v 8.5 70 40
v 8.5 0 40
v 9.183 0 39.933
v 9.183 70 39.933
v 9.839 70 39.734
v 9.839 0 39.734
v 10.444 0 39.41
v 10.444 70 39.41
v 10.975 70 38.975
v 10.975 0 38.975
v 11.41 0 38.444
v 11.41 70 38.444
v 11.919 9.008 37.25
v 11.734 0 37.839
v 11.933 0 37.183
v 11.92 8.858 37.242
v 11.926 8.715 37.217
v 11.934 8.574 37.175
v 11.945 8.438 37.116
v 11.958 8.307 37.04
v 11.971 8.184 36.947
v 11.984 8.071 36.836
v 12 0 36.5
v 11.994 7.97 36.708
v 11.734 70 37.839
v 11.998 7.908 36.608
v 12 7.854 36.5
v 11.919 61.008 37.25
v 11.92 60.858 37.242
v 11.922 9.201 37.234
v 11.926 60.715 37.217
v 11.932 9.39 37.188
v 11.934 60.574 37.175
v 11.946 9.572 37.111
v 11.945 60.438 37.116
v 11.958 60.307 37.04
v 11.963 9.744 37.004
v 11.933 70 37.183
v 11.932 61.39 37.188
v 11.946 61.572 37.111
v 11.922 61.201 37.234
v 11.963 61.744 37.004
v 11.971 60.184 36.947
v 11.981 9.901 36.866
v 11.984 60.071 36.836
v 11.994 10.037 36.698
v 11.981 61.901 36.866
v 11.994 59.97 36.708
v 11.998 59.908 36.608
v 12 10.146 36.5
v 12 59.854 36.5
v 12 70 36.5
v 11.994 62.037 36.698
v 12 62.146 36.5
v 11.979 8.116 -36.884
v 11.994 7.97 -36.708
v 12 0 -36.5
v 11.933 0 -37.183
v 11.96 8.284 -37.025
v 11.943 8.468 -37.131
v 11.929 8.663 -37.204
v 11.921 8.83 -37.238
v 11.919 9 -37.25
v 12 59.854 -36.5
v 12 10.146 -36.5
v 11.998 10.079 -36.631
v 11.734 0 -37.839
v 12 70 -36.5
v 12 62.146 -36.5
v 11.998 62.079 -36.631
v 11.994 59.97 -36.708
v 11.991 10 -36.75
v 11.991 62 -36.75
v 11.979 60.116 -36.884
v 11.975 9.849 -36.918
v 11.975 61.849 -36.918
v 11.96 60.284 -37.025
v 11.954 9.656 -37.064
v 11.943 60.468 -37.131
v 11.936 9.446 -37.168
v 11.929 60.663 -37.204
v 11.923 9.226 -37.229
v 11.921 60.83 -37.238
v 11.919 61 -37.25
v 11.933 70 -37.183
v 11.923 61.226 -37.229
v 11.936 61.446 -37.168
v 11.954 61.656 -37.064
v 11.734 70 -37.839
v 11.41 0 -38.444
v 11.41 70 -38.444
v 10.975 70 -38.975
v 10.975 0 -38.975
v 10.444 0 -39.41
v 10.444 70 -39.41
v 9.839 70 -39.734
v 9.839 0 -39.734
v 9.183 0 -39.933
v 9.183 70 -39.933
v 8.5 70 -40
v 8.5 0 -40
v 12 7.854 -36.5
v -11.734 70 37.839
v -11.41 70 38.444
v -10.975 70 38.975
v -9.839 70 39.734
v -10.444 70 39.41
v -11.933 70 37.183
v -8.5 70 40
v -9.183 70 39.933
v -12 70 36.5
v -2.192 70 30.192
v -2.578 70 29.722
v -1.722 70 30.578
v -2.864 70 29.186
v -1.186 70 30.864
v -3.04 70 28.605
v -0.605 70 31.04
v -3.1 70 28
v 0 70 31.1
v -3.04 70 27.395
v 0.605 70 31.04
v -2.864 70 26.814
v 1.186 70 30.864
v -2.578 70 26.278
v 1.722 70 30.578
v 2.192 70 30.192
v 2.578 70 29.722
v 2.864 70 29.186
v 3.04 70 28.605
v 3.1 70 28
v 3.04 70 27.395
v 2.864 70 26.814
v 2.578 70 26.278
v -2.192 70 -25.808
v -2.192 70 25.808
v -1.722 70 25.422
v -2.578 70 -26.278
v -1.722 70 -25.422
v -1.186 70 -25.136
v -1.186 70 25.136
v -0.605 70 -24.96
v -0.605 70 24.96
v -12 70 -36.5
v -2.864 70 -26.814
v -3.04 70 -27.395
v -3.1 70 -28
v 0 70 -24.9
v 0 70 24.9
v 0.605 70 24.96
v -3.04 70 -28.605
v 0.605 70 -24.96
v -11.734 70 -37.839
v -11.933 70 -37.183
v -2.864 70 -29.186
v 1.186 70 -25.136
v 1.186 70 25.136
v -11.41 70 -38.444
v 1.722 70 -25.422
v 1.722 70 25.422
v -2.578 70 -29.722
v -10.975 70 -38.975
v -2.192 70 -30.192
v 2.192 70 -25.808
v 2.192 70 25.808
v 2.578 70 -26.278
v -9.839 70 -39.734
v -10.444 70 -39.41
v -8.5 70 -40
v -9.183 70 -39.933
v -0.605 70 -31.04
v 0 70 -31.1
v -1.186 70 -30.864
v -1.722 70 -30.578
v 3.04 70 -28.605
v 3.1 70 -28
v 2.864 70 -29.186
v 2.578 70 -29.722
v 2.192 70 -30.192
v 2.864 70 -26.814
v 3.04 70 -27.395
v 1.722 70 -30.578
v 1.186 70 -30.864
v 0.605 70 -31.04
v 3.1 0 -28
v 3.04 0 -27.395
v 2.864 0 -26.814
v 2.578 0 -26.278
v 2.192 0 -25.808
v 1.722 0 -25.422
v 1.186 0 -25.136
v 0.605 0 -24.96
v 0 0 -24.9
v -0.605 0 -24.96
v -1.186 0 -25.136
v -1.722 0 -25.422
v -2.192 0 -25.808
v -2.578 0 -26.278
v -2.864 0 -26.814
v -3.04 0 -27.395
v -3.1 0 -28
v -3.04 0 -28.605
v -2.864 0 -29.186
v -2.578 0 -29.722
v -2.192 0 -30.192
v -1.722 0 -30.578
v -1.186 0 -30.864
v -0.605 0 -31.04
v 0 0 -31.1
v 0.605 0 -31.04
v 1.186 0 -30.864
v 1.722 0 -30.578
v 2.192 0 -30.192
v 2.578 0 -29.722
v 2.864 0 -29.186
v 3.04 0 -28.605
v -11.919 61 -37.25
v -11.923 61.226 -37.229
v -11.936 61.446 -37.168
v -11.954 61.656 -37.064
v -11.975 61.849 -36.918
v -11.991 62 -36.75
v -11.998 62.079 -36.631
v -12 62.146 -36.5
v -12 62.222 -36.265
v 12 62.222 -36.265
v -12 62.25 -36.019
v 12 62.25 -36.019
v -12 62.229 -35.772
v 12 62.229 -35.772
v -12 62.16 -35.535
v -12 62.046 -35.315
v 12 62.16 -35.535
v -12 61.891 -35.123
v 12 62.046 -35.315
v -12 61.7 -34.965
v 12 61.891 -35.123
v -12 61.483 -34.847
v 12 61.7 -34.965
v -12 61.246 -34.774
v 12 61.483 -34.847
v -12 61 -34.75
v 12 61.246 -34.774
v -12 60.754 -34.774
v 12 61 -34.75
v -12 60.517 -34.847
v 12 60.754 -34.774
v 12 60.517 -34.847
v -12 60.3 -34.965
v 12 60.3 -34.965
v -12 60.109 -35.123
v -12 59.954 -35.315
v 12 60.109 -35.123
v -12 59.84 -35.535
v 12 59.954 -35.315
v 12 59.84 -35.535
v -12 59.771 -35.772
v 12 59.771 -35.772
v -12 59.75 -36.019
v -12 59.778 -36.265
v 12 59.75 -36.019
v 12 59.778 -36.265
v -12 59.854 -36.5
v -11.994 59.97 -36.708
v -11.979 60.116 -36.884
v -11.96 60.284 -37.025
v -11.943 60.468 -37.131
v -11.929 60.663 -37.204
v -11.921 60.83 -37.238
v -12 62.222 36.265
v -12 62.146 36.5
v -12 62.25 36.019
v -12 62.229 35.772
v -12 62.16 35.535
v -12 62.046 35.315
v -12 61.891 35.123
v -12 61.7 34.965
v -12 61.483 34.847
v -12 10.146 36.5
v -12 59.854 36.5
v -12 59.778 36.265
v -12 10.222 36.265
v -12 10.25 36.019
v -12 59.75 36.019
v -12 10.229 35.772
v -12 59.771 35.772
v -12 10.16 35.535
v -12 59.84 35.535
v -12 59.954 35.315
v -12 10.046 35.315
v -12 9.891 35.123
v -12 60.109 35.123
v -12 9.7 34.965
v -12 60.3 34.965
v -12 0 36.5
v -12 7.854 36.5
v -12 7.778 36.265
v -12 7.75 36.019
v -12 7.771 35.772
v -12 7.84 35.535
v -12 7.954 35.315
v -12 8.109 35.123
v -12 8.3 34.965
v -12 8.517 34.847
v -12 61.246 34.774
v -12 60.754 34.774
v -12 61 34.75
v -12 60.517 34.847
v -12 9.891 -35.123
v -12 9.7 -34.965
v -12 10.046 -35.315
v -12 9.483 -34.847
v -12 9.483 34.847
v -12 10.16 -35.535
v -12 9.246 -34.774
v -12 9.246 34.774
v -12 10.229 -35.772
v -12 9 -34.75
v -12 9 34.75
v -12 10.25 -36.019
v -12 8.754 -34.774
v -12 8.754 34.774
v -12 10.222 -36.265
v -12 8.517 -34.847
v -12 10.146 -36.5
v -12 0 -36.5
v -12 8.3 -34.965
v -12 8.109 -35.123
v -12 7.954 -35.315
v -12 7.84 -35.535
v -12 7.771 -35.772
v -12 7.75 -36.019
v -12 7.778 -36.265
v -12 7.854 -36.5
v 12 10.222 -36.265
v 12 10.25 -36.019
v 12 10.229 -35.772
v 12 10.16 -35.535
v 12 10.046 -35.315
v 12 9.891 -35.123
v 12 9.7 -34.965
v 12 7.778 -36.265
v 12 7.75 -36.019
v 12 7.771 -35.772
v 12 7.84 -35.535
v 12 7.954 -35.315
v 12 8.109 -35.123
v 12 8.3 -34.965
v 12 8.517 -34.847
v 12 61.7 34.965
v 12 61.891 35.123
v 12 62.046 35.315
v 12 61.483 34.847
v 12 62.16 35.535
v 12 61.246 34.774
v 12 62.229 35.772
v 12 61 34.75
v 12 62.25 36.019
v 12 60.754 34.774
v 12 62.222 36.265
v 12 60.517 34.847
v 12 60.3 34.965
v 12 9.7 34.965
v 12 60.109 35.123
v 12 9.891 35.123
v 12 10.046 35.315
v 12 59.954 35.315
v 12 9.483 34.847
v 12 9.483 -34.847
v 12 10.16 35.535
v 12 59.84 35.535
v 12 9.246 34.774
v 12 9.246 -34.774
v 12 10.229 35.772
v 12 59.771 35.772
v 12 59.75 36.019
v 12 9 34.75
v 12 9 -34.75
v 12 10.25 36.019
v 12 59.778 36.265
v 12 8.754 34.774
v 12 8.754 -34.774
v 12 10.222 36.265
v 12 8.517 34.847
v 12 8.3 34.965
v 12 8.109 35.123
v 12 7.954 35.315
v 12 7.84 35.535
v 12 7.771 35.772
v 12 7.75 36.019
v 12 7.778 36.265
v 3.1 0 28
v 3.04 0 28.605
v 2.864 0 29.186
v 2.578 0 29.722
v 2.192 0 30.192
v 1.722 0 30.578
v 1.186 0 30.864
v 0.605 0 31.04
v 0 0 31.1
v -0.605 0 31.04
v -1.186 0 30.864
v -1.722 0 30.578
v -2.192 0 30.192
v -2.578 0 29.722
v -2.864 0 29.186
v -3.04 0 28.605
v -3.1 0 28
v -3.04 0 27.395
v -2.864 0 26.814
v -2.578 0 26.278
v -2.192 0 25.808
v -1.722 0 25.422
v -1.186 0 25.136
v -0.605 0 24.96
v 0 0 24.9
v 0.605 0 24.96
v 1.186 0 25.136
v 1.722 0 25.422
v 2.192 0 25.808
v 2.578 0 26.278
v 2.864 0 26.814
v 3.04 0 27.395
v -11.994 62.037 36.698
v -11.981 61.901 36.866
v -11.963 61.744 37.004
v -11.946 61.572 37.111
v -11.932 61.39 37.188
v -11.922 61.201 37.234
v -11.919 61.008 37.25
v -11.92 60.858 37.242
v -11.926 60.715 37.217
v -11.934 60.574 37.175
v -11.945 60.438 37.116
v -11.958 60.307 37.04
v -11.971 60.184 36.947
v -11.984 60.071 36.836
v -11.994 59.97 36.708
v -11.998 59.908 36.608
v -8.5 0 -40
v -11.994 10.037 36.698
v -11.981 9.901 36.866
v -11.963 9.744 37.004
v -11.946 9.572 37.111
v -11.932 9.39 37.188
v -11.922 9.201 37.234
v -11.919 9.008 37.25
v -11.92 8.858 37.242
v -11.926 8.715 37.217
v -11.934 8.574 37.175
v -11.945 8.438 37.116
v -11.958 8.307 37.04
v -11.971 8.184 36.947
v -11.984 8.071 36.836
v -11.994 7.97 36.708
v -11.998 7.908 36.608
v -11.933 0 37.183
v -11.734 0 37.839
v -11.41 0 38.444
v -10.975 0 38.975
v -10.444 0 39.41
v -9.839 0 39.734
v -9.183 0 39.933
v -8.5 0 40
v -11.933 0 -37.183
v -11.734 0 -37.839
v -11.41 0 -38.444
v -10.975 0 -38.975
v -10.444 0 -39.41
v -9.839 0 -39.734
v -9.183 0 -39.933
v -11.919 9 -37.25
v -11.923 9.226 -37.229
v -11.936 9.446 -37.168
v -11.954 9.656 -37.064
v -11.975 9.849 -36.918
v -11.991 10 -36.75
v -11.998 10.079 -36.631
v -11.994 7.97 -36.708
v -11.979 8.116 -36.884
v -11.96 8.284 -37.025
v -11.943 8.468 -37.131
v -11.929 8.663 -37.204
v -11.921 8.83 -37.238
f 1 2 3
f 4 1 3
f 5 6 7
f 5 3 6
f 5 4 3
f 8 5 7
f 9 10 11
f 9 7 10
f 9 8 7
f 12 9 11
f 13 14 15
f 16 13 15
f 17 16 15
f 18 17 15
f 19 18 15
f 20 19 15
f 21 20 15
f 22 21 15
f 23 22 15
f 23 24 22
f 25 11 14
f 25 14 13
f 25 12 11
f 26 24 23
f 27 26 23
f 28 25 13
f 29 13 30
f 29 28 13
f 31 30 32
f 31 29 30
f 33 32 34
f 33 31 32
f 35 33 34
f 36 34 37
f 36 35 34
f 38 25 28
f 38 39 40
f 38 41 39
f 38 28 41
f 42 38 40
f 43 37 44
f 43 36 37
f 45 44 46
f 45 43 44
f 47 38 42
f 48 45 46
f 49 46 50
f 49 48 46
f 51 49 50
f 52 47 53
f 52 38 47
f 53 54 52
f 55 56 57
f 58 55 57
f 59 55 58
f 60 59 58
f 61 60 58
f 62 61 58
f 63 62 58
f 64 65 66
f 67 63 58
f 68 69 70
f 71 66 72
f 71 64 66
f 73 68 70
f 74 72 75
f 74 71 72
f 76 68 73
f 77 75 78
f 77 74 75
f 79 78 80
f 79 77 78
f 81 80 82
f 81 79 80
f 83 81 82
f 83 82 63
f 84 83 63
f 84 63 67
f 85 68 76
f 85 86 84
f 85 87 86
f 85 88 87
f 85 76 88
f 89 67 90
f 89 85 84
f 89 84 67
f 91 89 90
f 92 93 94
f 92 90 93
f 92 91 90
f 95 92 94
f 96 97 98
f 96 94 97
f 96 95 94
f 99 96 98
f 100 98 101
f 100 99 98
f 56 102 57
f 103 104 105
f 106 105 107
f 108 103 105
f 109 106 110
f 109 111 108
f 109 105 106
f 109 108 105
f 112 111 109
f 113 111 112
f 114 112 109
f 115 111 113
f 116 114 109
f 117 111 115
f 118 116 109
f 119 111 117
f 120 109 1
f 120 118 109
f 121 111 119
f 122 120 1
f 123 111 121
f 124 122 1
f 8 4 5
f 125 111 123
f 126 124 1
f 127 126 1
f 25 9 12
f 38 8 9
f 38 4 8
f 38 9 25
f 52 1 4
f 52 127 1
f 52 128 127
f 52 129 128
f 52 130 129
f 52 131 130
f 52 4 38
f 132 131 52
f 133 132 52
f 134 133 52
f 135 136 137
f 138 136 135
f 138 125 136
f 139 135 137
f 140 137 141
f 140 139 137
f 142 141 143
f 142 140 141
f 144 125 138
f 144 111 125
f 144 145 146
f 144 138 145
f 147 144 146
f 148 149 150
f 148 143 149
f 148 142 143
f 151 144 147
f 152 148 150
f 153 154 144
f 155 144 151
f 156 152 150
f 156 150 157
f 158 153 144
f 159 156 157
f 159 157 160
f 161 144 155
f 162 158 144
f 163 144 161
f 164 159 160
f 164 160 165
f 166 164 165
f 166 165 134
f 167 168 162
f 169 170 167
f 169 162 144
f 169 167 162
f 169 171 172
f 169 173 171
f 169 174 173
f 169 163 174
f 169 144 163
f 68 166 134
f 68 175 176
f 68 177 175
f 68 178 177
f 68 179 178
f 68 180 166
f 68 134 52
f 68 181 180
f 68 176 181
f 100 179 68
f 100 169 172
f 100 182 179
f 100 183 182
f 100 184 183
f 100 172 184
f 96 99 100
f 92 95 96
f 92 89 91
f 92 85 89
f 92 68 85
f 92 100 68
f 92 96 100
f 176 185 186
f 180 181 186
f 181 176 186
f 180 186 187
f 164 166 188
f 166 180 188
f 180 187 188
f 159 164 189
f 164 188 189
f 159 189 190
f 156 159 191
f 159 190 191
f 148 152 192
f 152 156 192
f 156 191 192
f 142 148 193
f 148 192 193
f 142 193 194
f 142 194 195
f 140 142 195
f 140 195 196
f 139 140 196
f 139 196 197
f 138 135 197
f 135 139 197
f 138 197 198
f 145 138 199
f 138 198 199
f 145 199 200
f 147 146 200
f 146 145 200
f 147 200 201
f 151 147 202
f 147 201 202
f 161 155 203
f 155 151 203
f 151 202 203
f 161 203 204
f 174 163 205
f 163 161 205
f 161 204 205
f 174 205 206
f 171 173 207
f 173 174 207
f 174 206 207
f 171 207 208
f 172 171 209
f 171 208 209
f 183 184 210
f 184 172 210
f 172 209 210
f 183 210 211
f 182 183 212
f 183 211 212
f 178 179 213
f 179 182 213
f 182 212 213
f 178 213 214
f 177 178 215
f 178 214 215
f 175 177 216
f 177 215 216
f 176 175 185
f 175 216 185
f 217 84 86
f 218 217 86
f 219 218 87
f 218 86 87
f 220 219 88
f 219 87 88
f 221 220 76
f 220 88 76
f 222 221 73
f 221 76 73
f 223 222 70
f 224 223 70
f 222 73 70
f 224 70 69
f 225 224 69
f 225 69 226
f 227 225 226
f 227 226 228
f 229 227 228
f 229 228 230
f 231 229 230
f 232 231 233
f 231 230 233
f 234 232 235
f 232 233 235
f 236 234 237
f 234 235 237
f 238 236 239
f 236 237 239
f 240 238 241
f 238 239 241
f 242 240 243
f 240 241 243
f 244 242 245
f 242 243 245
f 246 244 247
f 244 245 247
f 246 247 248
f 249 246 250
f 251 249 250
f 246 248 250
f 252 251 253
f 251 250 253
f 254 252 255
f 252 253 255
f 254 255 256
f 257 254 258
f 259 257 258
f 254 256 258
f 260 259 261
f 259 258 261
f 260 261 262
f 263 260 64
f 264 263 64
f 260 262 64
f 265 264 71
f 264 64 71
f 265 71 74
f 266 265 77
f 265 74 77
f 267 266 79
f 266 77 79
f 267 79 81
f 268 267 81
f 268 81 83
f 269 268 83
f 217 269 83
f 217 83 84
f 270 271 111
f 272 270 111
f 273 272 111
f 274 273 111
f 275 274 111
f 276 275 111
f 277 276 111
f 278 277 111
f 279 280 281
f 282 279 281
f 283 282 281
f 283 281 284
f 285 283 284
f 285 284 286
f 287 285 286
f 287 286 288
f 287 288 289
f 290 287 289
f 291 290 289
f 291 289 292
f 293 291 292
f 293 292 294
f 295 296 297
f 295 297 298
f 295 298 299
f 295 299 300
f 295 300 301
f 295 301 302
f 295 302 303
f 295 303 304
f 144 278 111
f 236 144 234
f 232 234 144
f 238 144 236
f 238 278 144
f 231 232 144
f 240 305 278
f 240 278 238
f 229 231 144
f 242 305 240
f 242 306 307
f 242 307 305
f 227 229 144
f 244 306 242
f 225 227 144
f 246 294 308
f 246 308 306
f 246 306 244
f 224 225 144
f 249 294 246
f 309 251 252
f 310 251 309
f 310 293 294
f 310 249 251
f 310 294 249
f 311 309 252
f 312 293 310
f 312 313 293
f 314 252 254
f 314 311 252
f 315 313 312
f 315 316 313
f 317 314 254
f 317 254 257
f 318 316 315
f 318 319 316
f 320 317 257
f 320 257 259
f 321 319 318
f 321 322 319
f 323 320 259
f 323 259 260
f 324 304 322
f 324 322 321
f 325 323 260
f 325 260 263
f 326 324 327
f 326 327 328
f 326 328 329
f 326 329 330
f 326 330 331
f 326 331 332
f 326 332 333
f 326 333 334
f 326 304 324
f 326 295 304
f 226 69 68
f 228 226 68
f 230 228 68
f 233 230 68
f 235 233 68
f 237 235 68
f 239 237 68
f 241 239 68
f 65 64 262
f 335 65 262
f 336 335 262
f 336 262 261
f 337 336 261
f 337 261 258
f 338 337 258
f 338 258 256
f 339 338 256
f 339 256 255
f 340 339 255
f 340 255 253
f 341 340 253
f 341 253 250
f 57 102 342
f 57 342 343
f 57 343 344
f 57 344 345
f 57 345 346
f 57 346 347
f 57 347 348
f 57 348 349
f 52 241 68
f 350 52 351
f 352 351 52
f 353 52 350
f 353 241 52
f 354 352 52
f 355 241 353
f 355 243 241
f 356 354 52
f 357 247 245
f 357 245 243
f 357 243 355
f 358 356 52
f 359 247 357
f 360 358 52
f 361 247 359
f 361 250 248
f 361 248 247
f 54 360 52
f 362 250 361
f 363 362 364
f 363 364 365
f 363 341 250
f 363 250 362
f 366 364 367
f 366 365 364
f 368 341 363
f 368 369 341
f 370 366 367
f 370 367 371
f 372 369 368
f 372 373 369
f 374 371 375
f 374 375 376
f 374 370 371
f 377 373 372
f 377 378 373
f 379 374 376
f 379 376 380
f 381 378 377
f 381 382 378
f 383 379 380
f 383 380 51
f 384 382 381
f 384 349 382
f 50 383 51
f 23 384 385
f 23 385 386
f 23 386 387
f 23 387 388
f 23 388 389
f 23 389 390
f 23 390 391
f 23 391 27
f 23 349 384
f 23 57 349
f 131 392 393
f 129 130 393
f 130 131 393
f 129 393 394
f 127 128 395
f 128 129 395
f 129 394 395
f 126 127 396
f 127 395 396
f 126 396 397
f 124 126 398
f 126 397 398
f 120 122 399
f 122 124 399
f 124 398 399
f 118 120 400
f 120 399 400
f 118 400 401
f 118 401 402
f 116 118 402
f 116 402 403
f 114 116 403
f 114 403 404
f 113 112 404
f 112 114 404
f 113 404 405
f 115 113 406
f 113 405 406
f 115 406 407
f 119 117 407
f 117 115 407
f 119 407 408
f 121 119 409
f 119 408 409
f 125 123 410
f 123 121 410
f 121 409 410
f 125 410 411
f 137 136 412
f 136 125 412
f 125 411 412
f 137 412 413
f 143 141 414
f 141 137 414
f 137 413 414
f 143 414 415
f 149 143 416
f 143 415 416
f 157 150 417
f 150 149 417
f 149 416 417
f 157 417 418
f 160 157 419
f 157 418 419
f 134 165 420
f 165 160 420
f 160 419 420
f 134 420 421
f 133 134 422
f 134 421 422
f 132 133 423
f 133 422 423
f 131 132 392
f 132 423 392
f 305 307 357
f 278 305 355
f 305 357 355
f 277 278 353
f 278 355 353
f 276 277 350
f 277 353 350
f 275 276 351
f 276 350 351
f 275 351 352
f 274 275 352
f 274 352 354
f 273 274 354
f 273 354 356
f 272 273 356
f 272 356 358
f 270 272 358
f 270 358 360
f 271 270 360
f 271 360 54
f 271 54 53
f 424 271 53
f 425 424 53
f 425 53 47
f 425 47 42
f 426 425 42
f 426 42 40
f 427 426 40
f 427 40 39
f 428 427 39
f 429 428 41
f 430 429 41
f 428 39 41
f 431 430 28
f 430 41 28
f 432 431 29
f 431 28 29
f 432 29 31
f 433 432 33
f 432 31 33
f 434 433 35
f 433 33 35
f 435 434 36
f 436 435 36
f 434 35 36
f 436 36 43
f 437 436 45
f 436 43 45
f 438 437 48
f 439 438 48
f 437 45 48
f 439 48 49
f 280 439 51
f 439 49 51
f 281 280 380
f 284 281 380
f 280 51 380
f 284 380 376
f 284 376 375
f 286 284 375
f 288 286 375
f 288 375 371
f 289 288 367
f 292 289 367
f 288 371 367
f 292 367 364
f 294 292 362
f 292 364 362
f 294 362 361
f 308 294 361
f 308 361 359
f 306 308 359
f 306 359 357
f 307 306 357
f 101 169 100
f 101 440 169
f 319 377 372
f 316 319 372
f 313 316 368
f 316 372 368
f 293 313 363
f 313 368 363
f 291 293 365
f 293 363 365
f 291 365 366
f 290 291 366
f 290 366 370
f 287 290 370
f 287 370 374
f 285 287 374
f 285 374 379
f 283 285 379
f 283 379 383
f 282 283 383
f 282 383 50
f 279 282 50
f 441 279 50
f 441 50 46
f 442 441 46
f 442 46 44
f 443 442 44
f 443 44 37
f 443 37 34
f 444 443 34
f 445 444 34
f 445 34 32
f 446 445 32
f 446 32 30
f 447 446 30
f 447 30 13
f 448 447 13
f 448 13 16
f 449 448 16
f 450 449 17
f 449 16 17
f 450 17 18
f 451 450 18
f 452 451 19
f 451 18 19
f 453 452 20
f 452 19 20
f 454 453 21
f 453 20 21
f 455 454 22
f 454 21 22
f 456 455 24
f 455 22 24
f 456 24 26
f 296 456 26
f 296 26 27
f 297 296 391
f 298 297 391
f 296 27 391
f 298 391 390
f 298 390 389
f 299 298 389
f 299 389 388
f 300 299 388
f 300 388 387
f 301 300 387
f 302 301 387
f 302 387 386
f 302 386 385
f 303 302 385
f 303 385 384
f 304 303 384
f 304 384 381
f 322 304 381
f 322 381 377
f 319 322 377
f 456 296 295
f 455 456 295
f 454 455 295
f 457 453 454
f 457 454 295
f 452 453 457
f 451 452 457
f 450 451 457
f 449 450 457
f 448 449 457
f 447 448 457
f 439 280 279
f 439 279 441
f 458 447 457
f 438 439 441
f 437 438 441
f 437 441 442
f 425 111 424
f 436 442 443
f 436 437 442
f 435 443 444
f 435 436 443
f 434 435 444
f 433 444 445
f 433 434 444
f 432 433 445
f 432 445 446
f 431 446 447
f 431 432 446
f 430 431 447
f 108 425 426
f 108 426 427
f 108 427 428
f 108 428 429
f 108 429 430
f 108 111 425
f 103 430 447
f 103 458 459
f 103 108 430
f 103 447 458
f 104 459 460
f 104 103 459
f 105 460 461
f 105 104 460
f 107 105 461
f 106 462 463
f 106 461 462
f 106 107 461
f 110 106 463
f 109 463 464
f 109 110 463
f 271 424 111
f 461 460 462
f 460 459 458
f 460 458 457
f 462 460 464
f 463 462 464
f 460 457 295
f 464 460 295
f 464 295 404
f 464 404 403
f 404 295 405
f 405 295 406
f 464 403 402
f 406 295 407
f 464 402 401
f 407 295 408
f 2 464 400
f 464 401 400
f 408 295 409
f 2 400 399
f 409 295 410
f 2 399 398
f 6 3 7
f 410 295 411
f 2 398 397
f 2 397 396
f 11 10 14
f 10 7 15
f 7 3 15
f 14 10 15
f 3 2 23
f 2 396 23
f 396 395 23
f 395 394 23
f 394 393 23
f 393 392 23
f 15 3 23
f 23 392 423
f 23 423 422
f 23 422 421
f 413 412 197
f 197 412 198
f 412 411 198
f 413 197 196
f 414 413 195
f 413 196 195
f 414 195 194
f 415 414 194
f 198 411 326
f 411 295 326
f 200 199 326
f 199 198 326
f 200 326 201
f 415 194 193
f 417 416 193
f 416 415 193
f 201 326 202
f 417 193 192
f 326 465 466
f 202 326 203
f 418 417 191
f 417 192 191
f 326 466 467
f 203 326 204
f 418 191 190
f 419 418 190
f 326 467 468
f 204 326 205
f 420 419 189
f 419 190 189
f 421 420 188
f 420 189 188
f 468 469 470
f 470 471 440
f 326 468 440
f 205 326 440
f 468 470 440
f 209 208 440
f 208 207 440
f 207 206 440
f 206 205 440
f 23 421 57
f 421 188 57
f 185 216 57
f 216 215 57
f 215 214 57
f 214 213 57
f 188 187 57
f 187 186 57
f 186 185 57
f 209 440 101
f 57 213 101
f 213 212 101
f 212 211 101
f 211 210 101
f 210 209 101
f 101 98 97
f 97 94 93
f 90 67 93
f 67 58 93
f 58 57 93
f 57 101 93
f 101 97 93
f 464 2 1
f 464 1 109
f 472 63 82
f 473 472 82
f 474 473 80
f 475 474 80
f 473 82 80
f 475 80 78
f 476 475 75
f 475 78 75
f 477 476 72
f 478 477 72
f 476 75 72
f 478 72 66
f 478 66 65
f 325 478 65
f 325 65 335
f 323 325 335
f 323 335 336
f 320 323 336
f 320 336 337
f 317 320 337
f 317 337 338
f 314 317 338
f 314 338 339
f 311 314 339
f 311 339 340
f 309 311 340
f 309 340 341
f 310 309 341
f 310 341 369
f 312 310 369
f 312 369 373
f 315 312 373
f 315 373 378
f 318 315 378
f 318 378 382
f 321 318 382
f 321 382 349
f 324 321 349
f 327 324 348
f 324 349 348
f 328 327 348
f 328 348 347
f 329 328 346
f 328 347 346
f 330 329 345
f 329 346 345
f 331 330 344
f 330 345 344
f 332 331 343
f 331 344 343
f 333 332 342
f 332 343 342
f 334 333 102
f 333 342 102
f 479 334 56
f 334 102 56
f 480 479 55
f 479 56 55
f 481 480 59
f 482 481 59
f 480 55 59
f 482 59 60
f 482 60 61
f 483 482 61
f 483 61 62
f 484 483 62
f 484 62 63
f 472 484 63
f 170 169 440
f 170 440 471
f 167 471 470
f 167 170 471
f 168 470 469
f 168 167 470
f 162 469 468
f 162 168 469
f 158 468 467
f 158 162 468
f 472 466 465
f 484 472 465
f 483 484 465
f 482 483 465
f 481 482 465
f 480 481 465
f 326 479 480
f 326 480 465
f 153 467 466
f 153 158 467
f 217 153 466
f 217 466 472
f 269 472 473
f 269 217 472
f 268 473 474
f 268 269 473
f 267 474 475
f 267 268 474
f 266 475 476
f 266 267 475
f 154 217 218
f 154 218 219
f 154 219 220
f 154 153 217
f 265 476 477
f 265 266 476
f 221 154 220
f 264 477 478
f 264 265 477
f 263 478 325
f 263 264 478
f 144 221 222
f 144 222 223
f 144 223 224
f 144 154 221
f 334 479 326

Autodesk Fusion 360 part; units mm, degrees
sketch "Sketch1" plane through (0, 0, 0) normal (0, 1, 0) x (1, 0, 0)
  line L0 (-12, 40) -> (12, 40)
  line L1 (12, 40) -> (12, -40)
  line L2 (12, -40) -> (-12, -40)
  line L3 (-12, -40) -> (-12, 40)
  line L4 (-50, 0) -> (40, 0) construction
  line L5 (0, 60) -> (0, -56.3927) construction
  circle A0 centre (0, -28) radius 3.1
  circle A1 centre (0, 28) radius 3.1
  dimension "d1" = 24
  dimension "d2" = 80
  dimension "d3" = 12
  dimension "d4" = 40
  dimension "d5" = 6.2
  dimension "d6" = 12
  dimension "d7" = 12
extrude "Extrude1" add sketch "Sketch1" along normal blind 70
fillet "Fillet1" radius 3.5 4 edges at (-12, 35, 40) (-12, 35, -40) (12, 35, -40) (12, 35, 40)
sketch "Sketch3" plane through (12, 0, 0) normal (1, 0, 0) x (0, 0, -1)
  line L0 (-36.5, 70) -> (-36.5, 0)
  line L1 (-36.5, 0) -> (36.5, 0)
  line L2 (36.5, 0) -> (36.5, 70)
  line L3 (36.5, 70) -> (-36.5, 70)
  line L4 (36, 9) -> (-36, 9)
  line L5 (-36, 9) -> (-36, 61)
  line L6 (-36, 61) -> (36, 61)
  line L7 (36, 61) -> (36, 9)
  line L8 (36, 9) -> (-36, 61) construction
  line L9 (-36, 9) -> (36, 61) construction
  circle A0 centre (-36, 61) radius 1.25
  circle A1 centre (36, 61) radius 1.25
  circle A2 centre (-36, 9) radius 1.25
  circle A3 centre (36, 9) radius 1.25
  point P0 (0, 35)
  dimension "d12" = 72
  dimension "d13" = 52
  dimension "d14" = 36.5
  dimension "d15" = 73
  dimension "d16" = 2.5
  dimension "d17" = 2.5
  dimension "d18" = 2.5
  dimension "d19" = 2.5
  dimension "d20" = 70
  dimension "d21" = 35
extrude "Extrude2" cut sketch "Sketch3" against normal blind 24 contours L0 L5 L6 A0 | L0 A0 | L5 L6 A0 | L2 A1 | L2 L6 L7 A1 | L0 L4 L5 A2 | L0 A2 | L6 L7 A1 | L4 L5 A2 | L2 A3 | L2 L4 L7 A3 | L4 L7 A3
equation "d3 = d1 / 2"
equation "d4 = d2 / 2"
equation "d7 = d6"
equation "d14 = d15 / 2"
equation "d17 = d16"
equation "d18 = d16"
equation "d19 = d16"
equation "d21 = d20 / 2"
